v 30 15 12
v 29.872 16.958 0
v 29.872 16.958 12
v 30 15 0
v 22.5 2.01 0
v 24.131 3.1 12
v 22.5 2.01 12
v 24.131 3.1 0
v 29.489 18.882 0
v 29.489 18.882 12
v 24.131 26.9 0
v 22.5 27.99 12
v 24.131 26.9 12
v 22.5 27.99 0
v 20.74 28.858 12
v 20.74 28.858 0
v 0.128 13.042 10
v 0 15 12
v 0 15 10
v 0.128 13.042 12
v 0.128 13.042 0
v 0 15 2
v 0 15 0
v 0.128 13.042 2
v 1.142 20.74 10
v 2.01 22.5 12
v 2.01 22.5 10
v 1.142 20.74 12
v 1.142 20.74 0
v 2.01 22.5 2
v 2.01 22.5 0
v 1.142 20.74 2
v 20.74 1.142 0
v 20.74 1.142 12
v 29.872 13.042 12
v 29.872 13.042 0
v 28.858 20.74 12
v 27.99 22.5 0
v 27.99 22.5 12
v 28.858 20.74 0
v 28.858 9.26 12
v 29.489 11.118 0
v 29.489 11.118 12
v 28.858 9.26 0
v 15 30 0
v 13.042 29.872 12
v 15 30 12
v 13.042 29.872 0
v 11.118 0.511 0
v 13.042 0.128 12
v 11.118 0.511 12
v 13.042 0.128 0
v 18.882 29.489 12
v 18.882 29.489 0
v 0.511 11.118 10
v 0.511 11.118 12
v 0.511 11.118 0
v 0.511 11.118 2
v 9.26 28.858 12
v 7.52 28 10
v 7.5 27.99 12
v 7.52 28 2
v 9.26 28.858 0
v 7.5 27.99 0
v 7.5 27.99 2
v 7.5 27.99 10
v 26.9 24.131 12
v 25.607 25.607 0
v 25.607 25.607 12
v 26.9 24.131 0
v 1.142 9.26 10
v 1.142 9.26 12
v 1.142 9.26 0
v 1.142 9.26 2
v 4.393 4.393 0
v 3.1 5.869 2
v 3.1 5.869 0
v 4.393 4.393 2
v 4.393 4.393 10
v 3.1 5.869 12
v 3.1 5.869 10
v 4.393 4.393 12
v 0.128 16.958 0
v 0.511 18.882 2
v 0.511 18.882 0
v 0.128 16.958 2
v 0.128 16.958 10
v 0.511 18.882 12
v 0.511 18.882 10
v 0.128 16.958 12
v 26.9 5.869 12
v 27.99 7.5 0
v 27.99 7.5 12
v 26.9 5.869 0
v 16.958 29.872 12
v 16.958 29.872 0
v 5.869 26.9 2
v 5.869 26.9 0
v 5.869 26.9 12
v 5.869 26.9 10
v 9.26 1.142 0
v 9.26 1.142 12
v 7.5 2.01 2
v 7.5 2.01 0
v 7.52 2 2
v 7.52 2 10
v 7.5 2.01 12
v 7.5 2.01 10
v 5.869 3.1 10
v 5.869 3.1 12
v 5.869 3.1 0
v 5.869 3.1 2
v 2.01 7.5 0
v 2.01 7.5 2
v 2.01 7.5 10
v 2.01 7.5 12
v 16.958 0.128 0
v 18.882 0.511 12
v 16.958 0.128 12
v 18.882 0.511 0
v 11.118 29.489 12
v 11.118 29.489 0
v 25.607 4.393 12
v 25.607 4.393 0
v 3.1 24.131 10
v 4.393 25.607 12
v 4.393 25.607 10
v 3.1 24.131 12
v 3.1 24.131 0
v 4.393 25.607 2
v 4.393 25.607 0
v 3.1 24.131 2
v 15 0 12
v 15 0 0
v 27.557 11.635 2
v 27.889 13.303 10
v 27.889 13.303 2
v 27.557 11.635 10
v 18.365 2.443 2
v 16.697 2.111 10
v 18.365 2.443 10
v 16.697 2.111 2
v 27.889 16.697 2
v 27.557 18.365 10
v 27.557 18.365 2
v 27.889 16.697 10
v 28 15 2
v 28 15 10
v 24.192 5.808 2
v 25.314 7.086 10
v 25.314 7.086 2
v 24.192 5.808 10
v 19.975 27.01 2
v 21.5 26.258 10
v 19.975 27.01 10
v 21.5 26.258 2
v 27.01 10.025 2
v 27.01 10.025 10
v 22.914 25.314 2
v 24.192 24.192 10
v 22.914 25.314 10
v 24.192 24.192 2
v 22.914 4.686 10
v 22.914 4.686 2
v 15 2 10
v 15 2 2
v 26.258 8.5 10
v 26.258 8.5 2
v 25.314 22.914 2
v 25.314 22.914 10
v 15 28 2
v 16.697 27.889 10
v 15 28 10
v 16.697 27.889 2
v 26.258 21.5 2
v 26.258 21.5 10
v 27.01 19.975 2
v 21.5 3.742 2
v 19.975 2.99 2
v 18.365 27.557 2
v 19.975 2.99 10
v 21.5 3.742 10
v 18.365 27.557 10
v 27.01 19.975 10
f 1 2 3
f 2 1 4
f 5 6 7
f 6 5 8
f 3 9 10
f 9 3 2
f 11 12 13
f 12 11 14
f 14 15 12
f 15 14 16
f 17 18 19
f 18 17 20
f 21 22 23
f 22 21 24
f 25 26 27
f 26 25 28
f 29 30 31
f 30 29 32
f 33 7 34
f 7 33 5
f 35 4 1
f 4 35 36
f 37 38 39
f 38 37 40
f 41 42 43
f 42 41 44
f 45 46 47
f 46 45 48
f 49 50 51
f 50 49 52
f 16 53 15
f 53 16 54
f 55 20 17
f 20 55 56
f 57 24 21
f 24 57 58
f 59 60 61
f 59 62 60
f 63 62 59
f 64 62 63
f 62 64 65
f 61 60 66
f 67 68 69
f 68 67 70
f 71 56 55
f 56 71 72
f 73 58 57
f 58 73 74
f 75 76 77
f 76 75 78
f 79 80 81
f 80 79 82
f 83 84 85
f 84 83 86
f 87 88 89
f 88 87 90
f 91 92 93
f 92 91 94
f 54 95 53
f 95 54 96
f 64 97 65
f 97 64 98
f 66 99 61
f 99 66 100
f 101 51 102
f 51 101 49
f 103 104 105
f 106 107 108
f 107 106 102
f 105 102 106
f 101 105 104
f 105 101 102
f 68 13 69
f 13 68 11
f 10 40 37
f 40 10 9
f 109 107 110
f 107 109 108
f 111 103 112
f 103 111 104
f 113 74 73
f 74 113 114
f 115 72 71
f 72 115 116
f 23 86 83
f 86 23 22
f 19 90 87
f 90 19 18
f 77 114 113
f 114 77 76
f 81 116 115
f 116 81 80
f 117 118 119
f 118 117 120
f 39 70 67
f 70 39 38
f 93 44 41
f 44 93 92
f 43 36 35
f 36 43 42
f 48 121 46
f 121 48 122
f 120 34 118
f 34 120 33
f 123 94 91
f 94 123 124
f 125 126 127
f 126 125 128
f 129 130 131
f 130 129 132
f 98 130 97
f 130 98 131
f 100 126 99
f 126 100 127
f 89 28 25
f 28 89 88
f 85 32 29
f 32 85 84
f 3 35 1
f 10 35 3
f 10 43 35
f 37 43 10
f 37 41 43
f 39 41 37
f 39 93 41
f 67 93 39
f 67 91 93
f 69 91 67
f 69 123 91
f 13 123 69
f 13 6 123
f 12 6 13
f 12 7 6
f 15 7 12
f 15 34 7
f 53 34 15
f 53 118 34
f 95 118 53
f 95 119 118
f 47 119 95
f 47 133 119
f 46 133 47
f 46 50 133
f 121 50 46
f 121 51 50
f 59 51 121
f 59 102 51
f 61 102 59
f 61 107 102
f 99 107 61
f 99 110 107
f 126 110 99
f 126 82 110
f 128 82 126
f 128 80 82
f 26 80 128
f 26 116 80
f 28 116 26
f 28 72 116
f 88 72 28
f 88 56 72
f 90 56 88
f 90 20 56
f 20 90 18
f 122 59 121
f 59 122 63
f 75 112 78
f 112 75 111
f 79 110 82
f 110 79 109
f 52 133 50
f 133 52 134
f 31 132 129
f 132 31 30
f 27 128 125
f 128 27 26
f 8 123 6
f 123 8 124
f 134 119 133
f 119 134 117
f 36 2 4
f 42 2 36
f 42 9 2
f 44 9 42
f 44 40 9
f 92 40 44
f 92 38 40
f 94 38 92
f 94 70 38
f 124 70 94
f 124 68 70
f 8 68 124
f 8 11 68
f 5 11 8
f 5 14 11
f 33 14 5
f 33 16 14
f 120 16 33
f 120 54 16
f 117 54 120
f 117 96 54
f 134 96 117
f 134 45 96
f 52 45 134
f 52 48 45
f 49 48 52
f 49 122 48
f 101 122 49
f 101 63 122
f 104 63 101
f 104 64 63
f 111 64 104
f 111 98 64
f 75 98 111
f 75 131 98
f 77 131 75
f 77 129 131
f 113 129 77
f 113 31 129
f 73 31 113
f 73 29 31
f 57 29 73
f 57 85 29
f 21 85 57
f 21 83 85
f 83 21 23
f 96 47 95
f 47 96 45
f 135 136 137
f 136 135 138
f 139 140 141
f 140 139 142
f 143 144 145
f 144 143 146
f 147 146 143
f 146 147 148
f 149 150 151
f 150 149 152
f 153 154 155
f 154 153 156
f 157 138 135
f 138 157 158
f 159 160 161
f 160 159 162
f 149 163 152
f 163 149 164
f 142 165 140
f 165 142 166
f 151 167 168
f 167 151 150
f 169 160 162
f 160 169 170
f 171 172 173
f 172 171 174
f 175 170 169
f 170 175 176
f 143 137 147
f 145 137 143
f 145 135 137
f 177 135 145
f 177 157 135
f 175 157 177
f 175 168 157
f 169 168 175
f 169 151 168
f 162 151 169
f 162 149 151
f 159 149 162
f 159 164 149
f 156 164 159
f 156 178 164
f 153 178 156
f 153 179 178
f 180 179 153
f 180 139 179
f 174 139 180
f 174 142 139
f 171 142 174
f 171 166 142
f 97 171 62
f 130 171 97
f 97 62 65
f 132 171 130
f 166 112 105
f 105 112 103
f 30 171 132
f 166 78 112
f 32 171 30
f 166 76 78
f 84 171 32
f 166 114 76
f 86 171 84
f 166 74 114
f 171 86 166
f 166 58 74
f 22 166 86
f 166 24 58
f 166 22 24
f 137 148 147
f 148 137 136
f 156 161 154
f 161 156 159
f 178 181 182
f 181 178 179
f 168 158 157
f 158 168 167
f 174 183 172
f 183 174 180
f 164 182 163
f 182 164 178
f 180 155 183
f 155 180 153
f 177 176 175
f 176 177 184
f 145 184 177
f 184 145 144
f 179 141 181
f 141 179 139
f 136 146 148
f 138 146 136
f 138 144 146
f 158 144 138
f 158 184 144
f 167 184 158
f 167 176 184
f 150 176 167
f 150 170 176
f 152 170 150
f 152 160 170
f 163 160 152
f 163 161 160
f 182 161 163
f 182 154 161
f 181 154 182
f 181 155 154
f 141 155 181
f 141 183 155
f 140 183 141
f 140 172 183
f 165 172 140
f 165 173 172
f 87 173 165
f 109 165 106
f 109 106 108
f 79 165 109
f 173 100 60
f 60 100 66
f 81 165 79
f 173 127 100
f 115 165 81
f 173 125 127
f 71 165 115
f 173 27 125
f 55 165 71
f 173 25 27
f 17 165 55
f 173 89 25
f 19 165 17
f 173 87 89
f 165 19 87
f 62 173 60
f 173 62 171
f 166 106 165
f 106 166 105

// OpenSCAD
// units=mm — generated by scad_emitter.py
// part=unnamed
$fn = 48;

difference() { translate([15, 15, 0]) cylinder(h=12, r=15, $fn=$fn); translate([15, 15, 2]) cylinder(h=8, r=13, $fn=$fn); translate([-0.5, 2, 2]) cube([15.5, 26, 8]); }
